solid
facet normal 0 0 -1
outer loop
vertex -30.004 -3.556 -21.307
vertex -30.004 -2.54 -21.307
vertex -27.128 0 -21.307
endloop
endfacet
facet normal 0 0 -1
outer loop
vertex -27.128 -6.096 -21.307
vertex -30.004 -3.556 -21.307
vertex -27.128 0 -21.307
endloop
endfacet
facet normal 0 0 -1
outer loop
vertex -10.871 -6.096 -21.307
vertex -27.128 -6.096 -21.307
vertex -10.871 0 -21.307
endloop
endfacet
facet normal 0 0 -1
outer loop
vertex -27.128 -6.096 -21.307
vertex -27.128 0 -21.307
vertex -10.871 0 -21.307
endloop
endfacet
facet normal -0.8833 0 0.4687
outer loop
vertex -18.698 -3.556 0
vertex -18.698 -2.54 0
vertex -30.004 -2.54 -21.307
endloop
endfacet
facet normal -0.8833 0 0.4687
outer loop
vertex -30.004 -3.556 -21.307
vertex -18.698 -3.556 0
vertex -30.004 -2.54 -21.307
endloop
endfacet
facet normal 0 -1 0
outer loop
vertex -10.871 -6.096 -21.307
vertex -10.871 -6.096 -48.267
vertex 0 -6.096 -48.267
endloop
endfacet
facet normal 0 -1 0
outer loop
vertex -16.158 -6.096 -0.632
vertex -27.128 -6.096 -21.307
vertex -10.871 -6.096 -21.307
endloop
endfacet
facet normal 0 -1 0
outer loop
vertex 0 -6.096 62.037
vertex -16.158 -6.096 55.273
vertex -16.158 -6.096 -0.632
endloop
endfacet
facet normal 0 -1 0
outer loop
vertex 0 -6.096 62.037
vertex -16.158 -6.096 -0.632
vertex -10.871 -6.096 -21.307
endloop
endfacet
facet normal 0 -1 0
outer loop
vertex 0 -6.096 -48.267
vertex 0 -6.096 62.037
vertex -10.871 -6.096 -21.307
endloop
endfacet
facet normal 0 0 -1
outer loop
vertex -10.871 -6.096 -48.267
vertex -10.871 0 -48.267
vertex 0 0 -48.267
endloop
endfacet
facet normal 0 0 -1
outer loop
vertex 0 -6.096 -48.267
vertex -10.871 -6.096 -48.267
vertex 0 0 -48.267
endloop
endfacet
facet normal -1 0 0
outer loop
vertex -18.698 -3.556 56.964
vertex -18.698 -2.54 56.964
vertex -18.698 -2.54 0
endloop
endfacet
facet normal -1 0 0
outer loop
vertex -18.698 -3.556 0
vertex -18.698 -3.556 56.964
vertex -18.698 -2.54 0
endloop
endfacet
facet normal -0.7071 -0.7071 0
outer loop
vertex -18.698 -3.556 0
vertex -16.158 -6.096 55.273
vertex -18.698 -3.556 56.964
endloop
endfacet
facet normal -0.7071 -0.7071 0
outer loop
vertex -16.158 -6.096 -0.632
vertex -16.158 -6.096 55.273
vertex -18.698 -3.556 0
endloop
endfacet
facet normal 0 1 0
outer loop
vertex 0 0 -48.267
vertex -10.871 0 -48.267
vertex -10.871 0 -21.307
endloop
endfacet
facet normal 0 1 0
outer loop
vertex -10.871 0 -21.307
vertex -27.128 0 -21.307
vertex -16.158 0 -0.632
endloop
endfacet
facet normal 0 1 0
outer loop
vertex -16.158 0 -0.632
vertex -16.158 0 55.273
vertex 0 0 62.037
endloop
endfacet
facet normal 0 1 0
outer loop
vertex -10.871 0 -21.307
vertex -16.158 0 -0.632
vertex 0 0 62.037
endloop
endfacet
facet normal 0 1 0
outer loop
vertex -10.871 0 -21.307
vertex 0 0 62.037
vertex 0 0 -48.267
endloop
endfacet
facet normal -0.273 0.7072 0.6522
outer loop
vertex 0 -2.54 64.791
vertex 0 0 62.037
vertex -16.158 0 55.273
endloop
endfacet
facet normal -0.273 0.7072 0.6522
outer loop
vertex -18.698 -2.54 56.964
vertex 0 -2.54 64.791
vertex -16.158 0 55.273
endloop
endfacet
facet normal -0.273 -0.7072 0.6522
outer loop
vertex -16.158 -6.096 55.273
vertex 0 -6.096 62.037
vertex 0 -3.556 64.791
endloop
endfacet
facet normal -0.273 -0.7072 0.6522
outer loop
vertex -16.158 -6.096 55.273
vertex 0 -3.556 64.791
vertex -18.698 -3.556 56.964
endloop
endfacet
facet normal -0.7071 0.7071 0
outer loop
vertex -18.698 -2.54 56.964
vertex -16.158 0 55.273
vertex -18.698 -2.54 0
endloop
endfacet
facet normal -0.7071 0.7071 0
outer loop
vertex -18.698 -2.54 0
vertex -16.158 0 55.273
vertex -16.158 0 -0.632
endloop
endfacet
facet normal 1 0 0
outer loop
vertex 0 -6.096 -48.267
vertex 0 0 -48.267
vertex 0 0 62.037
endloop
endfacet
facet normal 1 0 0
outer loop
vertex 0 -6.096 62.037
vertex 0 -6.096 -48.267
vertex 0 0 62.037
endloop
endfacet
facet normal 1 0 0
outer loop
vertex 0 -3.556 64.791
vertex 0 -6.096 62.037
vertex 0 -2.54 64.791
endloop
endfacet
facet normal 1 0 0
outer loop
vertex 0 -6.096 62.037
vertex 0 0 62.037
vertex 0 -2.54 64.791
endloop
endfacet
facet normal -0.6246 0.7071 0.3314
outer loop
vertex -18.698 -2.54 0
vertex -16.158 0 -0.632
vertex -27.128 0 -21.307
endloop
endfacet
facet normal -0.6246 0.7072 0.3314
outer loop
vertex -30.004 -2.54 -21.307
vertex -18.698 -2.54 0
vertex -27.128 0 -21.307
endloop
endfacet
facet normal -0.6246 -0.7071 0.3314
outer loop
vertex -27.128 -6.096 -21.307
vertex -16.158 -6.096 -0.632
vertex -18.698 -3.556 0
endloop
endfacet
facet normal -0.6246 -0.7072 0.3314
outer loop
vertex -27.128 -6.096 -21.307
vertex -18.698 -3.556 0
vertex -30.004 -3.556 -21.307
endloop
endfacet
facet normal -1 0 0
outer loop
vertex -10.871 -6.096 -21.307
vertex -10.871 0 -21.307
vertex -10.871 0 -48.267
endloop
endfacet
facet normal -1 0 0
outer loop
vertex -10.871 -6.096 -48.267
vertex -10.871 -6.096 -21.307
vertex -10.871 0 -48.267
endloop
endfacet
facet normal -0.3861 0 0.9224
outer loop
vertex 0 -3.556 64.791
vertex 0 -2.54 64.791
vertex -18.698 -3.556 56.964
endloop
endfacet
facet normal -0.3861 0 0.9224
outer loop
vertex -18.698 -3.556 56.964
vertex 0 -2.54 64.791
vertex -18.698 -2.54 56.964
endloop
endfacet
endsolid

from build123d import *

# Parameters (mm, degrees)
F1_DEPTH = 6.096
F3_SIZE  = 2.54


# Not quite as in the source:
# - a feature of the source that left no trace in its solid (it failed there, or was rolled back) is left out


with BuildPart() as f1:
    # F0 (on Front) → F1 (new body)
    with BuildSketch(Plane.XZ):
        Polygon((0, 0), (0, 64.7907108068), (-18.6979882419, 56.9636411965), (-18.6979882419, 0), align=None)
        Polygon((0, -48.266902566), (0, 0), (-18.6979882419, 0), (-30.0037488341, -21.3070102036), (-10.8709232882, -21.3070102036), (-10.8709232882, -48.266902566), align=None)
    extrude(amount=F1_DEPTH)

    # F3
    f3_edges = [f1.edges().sort_by_distance(p)[0] for p in [
        (-18.697988, -6.096, 28.481821),
        (-24.350869, -6.096, -10.653505),
        (-9.348994, -6.096, 60.877176),
        (-9.348994, 0, 60.877176),
        (-18.697988, 0, 28.481821),
        (-24.350869, 0, -10.653505),
    ]]
    chamfer(f3_edges, length=F3_SIZE)


solid = f1.part
